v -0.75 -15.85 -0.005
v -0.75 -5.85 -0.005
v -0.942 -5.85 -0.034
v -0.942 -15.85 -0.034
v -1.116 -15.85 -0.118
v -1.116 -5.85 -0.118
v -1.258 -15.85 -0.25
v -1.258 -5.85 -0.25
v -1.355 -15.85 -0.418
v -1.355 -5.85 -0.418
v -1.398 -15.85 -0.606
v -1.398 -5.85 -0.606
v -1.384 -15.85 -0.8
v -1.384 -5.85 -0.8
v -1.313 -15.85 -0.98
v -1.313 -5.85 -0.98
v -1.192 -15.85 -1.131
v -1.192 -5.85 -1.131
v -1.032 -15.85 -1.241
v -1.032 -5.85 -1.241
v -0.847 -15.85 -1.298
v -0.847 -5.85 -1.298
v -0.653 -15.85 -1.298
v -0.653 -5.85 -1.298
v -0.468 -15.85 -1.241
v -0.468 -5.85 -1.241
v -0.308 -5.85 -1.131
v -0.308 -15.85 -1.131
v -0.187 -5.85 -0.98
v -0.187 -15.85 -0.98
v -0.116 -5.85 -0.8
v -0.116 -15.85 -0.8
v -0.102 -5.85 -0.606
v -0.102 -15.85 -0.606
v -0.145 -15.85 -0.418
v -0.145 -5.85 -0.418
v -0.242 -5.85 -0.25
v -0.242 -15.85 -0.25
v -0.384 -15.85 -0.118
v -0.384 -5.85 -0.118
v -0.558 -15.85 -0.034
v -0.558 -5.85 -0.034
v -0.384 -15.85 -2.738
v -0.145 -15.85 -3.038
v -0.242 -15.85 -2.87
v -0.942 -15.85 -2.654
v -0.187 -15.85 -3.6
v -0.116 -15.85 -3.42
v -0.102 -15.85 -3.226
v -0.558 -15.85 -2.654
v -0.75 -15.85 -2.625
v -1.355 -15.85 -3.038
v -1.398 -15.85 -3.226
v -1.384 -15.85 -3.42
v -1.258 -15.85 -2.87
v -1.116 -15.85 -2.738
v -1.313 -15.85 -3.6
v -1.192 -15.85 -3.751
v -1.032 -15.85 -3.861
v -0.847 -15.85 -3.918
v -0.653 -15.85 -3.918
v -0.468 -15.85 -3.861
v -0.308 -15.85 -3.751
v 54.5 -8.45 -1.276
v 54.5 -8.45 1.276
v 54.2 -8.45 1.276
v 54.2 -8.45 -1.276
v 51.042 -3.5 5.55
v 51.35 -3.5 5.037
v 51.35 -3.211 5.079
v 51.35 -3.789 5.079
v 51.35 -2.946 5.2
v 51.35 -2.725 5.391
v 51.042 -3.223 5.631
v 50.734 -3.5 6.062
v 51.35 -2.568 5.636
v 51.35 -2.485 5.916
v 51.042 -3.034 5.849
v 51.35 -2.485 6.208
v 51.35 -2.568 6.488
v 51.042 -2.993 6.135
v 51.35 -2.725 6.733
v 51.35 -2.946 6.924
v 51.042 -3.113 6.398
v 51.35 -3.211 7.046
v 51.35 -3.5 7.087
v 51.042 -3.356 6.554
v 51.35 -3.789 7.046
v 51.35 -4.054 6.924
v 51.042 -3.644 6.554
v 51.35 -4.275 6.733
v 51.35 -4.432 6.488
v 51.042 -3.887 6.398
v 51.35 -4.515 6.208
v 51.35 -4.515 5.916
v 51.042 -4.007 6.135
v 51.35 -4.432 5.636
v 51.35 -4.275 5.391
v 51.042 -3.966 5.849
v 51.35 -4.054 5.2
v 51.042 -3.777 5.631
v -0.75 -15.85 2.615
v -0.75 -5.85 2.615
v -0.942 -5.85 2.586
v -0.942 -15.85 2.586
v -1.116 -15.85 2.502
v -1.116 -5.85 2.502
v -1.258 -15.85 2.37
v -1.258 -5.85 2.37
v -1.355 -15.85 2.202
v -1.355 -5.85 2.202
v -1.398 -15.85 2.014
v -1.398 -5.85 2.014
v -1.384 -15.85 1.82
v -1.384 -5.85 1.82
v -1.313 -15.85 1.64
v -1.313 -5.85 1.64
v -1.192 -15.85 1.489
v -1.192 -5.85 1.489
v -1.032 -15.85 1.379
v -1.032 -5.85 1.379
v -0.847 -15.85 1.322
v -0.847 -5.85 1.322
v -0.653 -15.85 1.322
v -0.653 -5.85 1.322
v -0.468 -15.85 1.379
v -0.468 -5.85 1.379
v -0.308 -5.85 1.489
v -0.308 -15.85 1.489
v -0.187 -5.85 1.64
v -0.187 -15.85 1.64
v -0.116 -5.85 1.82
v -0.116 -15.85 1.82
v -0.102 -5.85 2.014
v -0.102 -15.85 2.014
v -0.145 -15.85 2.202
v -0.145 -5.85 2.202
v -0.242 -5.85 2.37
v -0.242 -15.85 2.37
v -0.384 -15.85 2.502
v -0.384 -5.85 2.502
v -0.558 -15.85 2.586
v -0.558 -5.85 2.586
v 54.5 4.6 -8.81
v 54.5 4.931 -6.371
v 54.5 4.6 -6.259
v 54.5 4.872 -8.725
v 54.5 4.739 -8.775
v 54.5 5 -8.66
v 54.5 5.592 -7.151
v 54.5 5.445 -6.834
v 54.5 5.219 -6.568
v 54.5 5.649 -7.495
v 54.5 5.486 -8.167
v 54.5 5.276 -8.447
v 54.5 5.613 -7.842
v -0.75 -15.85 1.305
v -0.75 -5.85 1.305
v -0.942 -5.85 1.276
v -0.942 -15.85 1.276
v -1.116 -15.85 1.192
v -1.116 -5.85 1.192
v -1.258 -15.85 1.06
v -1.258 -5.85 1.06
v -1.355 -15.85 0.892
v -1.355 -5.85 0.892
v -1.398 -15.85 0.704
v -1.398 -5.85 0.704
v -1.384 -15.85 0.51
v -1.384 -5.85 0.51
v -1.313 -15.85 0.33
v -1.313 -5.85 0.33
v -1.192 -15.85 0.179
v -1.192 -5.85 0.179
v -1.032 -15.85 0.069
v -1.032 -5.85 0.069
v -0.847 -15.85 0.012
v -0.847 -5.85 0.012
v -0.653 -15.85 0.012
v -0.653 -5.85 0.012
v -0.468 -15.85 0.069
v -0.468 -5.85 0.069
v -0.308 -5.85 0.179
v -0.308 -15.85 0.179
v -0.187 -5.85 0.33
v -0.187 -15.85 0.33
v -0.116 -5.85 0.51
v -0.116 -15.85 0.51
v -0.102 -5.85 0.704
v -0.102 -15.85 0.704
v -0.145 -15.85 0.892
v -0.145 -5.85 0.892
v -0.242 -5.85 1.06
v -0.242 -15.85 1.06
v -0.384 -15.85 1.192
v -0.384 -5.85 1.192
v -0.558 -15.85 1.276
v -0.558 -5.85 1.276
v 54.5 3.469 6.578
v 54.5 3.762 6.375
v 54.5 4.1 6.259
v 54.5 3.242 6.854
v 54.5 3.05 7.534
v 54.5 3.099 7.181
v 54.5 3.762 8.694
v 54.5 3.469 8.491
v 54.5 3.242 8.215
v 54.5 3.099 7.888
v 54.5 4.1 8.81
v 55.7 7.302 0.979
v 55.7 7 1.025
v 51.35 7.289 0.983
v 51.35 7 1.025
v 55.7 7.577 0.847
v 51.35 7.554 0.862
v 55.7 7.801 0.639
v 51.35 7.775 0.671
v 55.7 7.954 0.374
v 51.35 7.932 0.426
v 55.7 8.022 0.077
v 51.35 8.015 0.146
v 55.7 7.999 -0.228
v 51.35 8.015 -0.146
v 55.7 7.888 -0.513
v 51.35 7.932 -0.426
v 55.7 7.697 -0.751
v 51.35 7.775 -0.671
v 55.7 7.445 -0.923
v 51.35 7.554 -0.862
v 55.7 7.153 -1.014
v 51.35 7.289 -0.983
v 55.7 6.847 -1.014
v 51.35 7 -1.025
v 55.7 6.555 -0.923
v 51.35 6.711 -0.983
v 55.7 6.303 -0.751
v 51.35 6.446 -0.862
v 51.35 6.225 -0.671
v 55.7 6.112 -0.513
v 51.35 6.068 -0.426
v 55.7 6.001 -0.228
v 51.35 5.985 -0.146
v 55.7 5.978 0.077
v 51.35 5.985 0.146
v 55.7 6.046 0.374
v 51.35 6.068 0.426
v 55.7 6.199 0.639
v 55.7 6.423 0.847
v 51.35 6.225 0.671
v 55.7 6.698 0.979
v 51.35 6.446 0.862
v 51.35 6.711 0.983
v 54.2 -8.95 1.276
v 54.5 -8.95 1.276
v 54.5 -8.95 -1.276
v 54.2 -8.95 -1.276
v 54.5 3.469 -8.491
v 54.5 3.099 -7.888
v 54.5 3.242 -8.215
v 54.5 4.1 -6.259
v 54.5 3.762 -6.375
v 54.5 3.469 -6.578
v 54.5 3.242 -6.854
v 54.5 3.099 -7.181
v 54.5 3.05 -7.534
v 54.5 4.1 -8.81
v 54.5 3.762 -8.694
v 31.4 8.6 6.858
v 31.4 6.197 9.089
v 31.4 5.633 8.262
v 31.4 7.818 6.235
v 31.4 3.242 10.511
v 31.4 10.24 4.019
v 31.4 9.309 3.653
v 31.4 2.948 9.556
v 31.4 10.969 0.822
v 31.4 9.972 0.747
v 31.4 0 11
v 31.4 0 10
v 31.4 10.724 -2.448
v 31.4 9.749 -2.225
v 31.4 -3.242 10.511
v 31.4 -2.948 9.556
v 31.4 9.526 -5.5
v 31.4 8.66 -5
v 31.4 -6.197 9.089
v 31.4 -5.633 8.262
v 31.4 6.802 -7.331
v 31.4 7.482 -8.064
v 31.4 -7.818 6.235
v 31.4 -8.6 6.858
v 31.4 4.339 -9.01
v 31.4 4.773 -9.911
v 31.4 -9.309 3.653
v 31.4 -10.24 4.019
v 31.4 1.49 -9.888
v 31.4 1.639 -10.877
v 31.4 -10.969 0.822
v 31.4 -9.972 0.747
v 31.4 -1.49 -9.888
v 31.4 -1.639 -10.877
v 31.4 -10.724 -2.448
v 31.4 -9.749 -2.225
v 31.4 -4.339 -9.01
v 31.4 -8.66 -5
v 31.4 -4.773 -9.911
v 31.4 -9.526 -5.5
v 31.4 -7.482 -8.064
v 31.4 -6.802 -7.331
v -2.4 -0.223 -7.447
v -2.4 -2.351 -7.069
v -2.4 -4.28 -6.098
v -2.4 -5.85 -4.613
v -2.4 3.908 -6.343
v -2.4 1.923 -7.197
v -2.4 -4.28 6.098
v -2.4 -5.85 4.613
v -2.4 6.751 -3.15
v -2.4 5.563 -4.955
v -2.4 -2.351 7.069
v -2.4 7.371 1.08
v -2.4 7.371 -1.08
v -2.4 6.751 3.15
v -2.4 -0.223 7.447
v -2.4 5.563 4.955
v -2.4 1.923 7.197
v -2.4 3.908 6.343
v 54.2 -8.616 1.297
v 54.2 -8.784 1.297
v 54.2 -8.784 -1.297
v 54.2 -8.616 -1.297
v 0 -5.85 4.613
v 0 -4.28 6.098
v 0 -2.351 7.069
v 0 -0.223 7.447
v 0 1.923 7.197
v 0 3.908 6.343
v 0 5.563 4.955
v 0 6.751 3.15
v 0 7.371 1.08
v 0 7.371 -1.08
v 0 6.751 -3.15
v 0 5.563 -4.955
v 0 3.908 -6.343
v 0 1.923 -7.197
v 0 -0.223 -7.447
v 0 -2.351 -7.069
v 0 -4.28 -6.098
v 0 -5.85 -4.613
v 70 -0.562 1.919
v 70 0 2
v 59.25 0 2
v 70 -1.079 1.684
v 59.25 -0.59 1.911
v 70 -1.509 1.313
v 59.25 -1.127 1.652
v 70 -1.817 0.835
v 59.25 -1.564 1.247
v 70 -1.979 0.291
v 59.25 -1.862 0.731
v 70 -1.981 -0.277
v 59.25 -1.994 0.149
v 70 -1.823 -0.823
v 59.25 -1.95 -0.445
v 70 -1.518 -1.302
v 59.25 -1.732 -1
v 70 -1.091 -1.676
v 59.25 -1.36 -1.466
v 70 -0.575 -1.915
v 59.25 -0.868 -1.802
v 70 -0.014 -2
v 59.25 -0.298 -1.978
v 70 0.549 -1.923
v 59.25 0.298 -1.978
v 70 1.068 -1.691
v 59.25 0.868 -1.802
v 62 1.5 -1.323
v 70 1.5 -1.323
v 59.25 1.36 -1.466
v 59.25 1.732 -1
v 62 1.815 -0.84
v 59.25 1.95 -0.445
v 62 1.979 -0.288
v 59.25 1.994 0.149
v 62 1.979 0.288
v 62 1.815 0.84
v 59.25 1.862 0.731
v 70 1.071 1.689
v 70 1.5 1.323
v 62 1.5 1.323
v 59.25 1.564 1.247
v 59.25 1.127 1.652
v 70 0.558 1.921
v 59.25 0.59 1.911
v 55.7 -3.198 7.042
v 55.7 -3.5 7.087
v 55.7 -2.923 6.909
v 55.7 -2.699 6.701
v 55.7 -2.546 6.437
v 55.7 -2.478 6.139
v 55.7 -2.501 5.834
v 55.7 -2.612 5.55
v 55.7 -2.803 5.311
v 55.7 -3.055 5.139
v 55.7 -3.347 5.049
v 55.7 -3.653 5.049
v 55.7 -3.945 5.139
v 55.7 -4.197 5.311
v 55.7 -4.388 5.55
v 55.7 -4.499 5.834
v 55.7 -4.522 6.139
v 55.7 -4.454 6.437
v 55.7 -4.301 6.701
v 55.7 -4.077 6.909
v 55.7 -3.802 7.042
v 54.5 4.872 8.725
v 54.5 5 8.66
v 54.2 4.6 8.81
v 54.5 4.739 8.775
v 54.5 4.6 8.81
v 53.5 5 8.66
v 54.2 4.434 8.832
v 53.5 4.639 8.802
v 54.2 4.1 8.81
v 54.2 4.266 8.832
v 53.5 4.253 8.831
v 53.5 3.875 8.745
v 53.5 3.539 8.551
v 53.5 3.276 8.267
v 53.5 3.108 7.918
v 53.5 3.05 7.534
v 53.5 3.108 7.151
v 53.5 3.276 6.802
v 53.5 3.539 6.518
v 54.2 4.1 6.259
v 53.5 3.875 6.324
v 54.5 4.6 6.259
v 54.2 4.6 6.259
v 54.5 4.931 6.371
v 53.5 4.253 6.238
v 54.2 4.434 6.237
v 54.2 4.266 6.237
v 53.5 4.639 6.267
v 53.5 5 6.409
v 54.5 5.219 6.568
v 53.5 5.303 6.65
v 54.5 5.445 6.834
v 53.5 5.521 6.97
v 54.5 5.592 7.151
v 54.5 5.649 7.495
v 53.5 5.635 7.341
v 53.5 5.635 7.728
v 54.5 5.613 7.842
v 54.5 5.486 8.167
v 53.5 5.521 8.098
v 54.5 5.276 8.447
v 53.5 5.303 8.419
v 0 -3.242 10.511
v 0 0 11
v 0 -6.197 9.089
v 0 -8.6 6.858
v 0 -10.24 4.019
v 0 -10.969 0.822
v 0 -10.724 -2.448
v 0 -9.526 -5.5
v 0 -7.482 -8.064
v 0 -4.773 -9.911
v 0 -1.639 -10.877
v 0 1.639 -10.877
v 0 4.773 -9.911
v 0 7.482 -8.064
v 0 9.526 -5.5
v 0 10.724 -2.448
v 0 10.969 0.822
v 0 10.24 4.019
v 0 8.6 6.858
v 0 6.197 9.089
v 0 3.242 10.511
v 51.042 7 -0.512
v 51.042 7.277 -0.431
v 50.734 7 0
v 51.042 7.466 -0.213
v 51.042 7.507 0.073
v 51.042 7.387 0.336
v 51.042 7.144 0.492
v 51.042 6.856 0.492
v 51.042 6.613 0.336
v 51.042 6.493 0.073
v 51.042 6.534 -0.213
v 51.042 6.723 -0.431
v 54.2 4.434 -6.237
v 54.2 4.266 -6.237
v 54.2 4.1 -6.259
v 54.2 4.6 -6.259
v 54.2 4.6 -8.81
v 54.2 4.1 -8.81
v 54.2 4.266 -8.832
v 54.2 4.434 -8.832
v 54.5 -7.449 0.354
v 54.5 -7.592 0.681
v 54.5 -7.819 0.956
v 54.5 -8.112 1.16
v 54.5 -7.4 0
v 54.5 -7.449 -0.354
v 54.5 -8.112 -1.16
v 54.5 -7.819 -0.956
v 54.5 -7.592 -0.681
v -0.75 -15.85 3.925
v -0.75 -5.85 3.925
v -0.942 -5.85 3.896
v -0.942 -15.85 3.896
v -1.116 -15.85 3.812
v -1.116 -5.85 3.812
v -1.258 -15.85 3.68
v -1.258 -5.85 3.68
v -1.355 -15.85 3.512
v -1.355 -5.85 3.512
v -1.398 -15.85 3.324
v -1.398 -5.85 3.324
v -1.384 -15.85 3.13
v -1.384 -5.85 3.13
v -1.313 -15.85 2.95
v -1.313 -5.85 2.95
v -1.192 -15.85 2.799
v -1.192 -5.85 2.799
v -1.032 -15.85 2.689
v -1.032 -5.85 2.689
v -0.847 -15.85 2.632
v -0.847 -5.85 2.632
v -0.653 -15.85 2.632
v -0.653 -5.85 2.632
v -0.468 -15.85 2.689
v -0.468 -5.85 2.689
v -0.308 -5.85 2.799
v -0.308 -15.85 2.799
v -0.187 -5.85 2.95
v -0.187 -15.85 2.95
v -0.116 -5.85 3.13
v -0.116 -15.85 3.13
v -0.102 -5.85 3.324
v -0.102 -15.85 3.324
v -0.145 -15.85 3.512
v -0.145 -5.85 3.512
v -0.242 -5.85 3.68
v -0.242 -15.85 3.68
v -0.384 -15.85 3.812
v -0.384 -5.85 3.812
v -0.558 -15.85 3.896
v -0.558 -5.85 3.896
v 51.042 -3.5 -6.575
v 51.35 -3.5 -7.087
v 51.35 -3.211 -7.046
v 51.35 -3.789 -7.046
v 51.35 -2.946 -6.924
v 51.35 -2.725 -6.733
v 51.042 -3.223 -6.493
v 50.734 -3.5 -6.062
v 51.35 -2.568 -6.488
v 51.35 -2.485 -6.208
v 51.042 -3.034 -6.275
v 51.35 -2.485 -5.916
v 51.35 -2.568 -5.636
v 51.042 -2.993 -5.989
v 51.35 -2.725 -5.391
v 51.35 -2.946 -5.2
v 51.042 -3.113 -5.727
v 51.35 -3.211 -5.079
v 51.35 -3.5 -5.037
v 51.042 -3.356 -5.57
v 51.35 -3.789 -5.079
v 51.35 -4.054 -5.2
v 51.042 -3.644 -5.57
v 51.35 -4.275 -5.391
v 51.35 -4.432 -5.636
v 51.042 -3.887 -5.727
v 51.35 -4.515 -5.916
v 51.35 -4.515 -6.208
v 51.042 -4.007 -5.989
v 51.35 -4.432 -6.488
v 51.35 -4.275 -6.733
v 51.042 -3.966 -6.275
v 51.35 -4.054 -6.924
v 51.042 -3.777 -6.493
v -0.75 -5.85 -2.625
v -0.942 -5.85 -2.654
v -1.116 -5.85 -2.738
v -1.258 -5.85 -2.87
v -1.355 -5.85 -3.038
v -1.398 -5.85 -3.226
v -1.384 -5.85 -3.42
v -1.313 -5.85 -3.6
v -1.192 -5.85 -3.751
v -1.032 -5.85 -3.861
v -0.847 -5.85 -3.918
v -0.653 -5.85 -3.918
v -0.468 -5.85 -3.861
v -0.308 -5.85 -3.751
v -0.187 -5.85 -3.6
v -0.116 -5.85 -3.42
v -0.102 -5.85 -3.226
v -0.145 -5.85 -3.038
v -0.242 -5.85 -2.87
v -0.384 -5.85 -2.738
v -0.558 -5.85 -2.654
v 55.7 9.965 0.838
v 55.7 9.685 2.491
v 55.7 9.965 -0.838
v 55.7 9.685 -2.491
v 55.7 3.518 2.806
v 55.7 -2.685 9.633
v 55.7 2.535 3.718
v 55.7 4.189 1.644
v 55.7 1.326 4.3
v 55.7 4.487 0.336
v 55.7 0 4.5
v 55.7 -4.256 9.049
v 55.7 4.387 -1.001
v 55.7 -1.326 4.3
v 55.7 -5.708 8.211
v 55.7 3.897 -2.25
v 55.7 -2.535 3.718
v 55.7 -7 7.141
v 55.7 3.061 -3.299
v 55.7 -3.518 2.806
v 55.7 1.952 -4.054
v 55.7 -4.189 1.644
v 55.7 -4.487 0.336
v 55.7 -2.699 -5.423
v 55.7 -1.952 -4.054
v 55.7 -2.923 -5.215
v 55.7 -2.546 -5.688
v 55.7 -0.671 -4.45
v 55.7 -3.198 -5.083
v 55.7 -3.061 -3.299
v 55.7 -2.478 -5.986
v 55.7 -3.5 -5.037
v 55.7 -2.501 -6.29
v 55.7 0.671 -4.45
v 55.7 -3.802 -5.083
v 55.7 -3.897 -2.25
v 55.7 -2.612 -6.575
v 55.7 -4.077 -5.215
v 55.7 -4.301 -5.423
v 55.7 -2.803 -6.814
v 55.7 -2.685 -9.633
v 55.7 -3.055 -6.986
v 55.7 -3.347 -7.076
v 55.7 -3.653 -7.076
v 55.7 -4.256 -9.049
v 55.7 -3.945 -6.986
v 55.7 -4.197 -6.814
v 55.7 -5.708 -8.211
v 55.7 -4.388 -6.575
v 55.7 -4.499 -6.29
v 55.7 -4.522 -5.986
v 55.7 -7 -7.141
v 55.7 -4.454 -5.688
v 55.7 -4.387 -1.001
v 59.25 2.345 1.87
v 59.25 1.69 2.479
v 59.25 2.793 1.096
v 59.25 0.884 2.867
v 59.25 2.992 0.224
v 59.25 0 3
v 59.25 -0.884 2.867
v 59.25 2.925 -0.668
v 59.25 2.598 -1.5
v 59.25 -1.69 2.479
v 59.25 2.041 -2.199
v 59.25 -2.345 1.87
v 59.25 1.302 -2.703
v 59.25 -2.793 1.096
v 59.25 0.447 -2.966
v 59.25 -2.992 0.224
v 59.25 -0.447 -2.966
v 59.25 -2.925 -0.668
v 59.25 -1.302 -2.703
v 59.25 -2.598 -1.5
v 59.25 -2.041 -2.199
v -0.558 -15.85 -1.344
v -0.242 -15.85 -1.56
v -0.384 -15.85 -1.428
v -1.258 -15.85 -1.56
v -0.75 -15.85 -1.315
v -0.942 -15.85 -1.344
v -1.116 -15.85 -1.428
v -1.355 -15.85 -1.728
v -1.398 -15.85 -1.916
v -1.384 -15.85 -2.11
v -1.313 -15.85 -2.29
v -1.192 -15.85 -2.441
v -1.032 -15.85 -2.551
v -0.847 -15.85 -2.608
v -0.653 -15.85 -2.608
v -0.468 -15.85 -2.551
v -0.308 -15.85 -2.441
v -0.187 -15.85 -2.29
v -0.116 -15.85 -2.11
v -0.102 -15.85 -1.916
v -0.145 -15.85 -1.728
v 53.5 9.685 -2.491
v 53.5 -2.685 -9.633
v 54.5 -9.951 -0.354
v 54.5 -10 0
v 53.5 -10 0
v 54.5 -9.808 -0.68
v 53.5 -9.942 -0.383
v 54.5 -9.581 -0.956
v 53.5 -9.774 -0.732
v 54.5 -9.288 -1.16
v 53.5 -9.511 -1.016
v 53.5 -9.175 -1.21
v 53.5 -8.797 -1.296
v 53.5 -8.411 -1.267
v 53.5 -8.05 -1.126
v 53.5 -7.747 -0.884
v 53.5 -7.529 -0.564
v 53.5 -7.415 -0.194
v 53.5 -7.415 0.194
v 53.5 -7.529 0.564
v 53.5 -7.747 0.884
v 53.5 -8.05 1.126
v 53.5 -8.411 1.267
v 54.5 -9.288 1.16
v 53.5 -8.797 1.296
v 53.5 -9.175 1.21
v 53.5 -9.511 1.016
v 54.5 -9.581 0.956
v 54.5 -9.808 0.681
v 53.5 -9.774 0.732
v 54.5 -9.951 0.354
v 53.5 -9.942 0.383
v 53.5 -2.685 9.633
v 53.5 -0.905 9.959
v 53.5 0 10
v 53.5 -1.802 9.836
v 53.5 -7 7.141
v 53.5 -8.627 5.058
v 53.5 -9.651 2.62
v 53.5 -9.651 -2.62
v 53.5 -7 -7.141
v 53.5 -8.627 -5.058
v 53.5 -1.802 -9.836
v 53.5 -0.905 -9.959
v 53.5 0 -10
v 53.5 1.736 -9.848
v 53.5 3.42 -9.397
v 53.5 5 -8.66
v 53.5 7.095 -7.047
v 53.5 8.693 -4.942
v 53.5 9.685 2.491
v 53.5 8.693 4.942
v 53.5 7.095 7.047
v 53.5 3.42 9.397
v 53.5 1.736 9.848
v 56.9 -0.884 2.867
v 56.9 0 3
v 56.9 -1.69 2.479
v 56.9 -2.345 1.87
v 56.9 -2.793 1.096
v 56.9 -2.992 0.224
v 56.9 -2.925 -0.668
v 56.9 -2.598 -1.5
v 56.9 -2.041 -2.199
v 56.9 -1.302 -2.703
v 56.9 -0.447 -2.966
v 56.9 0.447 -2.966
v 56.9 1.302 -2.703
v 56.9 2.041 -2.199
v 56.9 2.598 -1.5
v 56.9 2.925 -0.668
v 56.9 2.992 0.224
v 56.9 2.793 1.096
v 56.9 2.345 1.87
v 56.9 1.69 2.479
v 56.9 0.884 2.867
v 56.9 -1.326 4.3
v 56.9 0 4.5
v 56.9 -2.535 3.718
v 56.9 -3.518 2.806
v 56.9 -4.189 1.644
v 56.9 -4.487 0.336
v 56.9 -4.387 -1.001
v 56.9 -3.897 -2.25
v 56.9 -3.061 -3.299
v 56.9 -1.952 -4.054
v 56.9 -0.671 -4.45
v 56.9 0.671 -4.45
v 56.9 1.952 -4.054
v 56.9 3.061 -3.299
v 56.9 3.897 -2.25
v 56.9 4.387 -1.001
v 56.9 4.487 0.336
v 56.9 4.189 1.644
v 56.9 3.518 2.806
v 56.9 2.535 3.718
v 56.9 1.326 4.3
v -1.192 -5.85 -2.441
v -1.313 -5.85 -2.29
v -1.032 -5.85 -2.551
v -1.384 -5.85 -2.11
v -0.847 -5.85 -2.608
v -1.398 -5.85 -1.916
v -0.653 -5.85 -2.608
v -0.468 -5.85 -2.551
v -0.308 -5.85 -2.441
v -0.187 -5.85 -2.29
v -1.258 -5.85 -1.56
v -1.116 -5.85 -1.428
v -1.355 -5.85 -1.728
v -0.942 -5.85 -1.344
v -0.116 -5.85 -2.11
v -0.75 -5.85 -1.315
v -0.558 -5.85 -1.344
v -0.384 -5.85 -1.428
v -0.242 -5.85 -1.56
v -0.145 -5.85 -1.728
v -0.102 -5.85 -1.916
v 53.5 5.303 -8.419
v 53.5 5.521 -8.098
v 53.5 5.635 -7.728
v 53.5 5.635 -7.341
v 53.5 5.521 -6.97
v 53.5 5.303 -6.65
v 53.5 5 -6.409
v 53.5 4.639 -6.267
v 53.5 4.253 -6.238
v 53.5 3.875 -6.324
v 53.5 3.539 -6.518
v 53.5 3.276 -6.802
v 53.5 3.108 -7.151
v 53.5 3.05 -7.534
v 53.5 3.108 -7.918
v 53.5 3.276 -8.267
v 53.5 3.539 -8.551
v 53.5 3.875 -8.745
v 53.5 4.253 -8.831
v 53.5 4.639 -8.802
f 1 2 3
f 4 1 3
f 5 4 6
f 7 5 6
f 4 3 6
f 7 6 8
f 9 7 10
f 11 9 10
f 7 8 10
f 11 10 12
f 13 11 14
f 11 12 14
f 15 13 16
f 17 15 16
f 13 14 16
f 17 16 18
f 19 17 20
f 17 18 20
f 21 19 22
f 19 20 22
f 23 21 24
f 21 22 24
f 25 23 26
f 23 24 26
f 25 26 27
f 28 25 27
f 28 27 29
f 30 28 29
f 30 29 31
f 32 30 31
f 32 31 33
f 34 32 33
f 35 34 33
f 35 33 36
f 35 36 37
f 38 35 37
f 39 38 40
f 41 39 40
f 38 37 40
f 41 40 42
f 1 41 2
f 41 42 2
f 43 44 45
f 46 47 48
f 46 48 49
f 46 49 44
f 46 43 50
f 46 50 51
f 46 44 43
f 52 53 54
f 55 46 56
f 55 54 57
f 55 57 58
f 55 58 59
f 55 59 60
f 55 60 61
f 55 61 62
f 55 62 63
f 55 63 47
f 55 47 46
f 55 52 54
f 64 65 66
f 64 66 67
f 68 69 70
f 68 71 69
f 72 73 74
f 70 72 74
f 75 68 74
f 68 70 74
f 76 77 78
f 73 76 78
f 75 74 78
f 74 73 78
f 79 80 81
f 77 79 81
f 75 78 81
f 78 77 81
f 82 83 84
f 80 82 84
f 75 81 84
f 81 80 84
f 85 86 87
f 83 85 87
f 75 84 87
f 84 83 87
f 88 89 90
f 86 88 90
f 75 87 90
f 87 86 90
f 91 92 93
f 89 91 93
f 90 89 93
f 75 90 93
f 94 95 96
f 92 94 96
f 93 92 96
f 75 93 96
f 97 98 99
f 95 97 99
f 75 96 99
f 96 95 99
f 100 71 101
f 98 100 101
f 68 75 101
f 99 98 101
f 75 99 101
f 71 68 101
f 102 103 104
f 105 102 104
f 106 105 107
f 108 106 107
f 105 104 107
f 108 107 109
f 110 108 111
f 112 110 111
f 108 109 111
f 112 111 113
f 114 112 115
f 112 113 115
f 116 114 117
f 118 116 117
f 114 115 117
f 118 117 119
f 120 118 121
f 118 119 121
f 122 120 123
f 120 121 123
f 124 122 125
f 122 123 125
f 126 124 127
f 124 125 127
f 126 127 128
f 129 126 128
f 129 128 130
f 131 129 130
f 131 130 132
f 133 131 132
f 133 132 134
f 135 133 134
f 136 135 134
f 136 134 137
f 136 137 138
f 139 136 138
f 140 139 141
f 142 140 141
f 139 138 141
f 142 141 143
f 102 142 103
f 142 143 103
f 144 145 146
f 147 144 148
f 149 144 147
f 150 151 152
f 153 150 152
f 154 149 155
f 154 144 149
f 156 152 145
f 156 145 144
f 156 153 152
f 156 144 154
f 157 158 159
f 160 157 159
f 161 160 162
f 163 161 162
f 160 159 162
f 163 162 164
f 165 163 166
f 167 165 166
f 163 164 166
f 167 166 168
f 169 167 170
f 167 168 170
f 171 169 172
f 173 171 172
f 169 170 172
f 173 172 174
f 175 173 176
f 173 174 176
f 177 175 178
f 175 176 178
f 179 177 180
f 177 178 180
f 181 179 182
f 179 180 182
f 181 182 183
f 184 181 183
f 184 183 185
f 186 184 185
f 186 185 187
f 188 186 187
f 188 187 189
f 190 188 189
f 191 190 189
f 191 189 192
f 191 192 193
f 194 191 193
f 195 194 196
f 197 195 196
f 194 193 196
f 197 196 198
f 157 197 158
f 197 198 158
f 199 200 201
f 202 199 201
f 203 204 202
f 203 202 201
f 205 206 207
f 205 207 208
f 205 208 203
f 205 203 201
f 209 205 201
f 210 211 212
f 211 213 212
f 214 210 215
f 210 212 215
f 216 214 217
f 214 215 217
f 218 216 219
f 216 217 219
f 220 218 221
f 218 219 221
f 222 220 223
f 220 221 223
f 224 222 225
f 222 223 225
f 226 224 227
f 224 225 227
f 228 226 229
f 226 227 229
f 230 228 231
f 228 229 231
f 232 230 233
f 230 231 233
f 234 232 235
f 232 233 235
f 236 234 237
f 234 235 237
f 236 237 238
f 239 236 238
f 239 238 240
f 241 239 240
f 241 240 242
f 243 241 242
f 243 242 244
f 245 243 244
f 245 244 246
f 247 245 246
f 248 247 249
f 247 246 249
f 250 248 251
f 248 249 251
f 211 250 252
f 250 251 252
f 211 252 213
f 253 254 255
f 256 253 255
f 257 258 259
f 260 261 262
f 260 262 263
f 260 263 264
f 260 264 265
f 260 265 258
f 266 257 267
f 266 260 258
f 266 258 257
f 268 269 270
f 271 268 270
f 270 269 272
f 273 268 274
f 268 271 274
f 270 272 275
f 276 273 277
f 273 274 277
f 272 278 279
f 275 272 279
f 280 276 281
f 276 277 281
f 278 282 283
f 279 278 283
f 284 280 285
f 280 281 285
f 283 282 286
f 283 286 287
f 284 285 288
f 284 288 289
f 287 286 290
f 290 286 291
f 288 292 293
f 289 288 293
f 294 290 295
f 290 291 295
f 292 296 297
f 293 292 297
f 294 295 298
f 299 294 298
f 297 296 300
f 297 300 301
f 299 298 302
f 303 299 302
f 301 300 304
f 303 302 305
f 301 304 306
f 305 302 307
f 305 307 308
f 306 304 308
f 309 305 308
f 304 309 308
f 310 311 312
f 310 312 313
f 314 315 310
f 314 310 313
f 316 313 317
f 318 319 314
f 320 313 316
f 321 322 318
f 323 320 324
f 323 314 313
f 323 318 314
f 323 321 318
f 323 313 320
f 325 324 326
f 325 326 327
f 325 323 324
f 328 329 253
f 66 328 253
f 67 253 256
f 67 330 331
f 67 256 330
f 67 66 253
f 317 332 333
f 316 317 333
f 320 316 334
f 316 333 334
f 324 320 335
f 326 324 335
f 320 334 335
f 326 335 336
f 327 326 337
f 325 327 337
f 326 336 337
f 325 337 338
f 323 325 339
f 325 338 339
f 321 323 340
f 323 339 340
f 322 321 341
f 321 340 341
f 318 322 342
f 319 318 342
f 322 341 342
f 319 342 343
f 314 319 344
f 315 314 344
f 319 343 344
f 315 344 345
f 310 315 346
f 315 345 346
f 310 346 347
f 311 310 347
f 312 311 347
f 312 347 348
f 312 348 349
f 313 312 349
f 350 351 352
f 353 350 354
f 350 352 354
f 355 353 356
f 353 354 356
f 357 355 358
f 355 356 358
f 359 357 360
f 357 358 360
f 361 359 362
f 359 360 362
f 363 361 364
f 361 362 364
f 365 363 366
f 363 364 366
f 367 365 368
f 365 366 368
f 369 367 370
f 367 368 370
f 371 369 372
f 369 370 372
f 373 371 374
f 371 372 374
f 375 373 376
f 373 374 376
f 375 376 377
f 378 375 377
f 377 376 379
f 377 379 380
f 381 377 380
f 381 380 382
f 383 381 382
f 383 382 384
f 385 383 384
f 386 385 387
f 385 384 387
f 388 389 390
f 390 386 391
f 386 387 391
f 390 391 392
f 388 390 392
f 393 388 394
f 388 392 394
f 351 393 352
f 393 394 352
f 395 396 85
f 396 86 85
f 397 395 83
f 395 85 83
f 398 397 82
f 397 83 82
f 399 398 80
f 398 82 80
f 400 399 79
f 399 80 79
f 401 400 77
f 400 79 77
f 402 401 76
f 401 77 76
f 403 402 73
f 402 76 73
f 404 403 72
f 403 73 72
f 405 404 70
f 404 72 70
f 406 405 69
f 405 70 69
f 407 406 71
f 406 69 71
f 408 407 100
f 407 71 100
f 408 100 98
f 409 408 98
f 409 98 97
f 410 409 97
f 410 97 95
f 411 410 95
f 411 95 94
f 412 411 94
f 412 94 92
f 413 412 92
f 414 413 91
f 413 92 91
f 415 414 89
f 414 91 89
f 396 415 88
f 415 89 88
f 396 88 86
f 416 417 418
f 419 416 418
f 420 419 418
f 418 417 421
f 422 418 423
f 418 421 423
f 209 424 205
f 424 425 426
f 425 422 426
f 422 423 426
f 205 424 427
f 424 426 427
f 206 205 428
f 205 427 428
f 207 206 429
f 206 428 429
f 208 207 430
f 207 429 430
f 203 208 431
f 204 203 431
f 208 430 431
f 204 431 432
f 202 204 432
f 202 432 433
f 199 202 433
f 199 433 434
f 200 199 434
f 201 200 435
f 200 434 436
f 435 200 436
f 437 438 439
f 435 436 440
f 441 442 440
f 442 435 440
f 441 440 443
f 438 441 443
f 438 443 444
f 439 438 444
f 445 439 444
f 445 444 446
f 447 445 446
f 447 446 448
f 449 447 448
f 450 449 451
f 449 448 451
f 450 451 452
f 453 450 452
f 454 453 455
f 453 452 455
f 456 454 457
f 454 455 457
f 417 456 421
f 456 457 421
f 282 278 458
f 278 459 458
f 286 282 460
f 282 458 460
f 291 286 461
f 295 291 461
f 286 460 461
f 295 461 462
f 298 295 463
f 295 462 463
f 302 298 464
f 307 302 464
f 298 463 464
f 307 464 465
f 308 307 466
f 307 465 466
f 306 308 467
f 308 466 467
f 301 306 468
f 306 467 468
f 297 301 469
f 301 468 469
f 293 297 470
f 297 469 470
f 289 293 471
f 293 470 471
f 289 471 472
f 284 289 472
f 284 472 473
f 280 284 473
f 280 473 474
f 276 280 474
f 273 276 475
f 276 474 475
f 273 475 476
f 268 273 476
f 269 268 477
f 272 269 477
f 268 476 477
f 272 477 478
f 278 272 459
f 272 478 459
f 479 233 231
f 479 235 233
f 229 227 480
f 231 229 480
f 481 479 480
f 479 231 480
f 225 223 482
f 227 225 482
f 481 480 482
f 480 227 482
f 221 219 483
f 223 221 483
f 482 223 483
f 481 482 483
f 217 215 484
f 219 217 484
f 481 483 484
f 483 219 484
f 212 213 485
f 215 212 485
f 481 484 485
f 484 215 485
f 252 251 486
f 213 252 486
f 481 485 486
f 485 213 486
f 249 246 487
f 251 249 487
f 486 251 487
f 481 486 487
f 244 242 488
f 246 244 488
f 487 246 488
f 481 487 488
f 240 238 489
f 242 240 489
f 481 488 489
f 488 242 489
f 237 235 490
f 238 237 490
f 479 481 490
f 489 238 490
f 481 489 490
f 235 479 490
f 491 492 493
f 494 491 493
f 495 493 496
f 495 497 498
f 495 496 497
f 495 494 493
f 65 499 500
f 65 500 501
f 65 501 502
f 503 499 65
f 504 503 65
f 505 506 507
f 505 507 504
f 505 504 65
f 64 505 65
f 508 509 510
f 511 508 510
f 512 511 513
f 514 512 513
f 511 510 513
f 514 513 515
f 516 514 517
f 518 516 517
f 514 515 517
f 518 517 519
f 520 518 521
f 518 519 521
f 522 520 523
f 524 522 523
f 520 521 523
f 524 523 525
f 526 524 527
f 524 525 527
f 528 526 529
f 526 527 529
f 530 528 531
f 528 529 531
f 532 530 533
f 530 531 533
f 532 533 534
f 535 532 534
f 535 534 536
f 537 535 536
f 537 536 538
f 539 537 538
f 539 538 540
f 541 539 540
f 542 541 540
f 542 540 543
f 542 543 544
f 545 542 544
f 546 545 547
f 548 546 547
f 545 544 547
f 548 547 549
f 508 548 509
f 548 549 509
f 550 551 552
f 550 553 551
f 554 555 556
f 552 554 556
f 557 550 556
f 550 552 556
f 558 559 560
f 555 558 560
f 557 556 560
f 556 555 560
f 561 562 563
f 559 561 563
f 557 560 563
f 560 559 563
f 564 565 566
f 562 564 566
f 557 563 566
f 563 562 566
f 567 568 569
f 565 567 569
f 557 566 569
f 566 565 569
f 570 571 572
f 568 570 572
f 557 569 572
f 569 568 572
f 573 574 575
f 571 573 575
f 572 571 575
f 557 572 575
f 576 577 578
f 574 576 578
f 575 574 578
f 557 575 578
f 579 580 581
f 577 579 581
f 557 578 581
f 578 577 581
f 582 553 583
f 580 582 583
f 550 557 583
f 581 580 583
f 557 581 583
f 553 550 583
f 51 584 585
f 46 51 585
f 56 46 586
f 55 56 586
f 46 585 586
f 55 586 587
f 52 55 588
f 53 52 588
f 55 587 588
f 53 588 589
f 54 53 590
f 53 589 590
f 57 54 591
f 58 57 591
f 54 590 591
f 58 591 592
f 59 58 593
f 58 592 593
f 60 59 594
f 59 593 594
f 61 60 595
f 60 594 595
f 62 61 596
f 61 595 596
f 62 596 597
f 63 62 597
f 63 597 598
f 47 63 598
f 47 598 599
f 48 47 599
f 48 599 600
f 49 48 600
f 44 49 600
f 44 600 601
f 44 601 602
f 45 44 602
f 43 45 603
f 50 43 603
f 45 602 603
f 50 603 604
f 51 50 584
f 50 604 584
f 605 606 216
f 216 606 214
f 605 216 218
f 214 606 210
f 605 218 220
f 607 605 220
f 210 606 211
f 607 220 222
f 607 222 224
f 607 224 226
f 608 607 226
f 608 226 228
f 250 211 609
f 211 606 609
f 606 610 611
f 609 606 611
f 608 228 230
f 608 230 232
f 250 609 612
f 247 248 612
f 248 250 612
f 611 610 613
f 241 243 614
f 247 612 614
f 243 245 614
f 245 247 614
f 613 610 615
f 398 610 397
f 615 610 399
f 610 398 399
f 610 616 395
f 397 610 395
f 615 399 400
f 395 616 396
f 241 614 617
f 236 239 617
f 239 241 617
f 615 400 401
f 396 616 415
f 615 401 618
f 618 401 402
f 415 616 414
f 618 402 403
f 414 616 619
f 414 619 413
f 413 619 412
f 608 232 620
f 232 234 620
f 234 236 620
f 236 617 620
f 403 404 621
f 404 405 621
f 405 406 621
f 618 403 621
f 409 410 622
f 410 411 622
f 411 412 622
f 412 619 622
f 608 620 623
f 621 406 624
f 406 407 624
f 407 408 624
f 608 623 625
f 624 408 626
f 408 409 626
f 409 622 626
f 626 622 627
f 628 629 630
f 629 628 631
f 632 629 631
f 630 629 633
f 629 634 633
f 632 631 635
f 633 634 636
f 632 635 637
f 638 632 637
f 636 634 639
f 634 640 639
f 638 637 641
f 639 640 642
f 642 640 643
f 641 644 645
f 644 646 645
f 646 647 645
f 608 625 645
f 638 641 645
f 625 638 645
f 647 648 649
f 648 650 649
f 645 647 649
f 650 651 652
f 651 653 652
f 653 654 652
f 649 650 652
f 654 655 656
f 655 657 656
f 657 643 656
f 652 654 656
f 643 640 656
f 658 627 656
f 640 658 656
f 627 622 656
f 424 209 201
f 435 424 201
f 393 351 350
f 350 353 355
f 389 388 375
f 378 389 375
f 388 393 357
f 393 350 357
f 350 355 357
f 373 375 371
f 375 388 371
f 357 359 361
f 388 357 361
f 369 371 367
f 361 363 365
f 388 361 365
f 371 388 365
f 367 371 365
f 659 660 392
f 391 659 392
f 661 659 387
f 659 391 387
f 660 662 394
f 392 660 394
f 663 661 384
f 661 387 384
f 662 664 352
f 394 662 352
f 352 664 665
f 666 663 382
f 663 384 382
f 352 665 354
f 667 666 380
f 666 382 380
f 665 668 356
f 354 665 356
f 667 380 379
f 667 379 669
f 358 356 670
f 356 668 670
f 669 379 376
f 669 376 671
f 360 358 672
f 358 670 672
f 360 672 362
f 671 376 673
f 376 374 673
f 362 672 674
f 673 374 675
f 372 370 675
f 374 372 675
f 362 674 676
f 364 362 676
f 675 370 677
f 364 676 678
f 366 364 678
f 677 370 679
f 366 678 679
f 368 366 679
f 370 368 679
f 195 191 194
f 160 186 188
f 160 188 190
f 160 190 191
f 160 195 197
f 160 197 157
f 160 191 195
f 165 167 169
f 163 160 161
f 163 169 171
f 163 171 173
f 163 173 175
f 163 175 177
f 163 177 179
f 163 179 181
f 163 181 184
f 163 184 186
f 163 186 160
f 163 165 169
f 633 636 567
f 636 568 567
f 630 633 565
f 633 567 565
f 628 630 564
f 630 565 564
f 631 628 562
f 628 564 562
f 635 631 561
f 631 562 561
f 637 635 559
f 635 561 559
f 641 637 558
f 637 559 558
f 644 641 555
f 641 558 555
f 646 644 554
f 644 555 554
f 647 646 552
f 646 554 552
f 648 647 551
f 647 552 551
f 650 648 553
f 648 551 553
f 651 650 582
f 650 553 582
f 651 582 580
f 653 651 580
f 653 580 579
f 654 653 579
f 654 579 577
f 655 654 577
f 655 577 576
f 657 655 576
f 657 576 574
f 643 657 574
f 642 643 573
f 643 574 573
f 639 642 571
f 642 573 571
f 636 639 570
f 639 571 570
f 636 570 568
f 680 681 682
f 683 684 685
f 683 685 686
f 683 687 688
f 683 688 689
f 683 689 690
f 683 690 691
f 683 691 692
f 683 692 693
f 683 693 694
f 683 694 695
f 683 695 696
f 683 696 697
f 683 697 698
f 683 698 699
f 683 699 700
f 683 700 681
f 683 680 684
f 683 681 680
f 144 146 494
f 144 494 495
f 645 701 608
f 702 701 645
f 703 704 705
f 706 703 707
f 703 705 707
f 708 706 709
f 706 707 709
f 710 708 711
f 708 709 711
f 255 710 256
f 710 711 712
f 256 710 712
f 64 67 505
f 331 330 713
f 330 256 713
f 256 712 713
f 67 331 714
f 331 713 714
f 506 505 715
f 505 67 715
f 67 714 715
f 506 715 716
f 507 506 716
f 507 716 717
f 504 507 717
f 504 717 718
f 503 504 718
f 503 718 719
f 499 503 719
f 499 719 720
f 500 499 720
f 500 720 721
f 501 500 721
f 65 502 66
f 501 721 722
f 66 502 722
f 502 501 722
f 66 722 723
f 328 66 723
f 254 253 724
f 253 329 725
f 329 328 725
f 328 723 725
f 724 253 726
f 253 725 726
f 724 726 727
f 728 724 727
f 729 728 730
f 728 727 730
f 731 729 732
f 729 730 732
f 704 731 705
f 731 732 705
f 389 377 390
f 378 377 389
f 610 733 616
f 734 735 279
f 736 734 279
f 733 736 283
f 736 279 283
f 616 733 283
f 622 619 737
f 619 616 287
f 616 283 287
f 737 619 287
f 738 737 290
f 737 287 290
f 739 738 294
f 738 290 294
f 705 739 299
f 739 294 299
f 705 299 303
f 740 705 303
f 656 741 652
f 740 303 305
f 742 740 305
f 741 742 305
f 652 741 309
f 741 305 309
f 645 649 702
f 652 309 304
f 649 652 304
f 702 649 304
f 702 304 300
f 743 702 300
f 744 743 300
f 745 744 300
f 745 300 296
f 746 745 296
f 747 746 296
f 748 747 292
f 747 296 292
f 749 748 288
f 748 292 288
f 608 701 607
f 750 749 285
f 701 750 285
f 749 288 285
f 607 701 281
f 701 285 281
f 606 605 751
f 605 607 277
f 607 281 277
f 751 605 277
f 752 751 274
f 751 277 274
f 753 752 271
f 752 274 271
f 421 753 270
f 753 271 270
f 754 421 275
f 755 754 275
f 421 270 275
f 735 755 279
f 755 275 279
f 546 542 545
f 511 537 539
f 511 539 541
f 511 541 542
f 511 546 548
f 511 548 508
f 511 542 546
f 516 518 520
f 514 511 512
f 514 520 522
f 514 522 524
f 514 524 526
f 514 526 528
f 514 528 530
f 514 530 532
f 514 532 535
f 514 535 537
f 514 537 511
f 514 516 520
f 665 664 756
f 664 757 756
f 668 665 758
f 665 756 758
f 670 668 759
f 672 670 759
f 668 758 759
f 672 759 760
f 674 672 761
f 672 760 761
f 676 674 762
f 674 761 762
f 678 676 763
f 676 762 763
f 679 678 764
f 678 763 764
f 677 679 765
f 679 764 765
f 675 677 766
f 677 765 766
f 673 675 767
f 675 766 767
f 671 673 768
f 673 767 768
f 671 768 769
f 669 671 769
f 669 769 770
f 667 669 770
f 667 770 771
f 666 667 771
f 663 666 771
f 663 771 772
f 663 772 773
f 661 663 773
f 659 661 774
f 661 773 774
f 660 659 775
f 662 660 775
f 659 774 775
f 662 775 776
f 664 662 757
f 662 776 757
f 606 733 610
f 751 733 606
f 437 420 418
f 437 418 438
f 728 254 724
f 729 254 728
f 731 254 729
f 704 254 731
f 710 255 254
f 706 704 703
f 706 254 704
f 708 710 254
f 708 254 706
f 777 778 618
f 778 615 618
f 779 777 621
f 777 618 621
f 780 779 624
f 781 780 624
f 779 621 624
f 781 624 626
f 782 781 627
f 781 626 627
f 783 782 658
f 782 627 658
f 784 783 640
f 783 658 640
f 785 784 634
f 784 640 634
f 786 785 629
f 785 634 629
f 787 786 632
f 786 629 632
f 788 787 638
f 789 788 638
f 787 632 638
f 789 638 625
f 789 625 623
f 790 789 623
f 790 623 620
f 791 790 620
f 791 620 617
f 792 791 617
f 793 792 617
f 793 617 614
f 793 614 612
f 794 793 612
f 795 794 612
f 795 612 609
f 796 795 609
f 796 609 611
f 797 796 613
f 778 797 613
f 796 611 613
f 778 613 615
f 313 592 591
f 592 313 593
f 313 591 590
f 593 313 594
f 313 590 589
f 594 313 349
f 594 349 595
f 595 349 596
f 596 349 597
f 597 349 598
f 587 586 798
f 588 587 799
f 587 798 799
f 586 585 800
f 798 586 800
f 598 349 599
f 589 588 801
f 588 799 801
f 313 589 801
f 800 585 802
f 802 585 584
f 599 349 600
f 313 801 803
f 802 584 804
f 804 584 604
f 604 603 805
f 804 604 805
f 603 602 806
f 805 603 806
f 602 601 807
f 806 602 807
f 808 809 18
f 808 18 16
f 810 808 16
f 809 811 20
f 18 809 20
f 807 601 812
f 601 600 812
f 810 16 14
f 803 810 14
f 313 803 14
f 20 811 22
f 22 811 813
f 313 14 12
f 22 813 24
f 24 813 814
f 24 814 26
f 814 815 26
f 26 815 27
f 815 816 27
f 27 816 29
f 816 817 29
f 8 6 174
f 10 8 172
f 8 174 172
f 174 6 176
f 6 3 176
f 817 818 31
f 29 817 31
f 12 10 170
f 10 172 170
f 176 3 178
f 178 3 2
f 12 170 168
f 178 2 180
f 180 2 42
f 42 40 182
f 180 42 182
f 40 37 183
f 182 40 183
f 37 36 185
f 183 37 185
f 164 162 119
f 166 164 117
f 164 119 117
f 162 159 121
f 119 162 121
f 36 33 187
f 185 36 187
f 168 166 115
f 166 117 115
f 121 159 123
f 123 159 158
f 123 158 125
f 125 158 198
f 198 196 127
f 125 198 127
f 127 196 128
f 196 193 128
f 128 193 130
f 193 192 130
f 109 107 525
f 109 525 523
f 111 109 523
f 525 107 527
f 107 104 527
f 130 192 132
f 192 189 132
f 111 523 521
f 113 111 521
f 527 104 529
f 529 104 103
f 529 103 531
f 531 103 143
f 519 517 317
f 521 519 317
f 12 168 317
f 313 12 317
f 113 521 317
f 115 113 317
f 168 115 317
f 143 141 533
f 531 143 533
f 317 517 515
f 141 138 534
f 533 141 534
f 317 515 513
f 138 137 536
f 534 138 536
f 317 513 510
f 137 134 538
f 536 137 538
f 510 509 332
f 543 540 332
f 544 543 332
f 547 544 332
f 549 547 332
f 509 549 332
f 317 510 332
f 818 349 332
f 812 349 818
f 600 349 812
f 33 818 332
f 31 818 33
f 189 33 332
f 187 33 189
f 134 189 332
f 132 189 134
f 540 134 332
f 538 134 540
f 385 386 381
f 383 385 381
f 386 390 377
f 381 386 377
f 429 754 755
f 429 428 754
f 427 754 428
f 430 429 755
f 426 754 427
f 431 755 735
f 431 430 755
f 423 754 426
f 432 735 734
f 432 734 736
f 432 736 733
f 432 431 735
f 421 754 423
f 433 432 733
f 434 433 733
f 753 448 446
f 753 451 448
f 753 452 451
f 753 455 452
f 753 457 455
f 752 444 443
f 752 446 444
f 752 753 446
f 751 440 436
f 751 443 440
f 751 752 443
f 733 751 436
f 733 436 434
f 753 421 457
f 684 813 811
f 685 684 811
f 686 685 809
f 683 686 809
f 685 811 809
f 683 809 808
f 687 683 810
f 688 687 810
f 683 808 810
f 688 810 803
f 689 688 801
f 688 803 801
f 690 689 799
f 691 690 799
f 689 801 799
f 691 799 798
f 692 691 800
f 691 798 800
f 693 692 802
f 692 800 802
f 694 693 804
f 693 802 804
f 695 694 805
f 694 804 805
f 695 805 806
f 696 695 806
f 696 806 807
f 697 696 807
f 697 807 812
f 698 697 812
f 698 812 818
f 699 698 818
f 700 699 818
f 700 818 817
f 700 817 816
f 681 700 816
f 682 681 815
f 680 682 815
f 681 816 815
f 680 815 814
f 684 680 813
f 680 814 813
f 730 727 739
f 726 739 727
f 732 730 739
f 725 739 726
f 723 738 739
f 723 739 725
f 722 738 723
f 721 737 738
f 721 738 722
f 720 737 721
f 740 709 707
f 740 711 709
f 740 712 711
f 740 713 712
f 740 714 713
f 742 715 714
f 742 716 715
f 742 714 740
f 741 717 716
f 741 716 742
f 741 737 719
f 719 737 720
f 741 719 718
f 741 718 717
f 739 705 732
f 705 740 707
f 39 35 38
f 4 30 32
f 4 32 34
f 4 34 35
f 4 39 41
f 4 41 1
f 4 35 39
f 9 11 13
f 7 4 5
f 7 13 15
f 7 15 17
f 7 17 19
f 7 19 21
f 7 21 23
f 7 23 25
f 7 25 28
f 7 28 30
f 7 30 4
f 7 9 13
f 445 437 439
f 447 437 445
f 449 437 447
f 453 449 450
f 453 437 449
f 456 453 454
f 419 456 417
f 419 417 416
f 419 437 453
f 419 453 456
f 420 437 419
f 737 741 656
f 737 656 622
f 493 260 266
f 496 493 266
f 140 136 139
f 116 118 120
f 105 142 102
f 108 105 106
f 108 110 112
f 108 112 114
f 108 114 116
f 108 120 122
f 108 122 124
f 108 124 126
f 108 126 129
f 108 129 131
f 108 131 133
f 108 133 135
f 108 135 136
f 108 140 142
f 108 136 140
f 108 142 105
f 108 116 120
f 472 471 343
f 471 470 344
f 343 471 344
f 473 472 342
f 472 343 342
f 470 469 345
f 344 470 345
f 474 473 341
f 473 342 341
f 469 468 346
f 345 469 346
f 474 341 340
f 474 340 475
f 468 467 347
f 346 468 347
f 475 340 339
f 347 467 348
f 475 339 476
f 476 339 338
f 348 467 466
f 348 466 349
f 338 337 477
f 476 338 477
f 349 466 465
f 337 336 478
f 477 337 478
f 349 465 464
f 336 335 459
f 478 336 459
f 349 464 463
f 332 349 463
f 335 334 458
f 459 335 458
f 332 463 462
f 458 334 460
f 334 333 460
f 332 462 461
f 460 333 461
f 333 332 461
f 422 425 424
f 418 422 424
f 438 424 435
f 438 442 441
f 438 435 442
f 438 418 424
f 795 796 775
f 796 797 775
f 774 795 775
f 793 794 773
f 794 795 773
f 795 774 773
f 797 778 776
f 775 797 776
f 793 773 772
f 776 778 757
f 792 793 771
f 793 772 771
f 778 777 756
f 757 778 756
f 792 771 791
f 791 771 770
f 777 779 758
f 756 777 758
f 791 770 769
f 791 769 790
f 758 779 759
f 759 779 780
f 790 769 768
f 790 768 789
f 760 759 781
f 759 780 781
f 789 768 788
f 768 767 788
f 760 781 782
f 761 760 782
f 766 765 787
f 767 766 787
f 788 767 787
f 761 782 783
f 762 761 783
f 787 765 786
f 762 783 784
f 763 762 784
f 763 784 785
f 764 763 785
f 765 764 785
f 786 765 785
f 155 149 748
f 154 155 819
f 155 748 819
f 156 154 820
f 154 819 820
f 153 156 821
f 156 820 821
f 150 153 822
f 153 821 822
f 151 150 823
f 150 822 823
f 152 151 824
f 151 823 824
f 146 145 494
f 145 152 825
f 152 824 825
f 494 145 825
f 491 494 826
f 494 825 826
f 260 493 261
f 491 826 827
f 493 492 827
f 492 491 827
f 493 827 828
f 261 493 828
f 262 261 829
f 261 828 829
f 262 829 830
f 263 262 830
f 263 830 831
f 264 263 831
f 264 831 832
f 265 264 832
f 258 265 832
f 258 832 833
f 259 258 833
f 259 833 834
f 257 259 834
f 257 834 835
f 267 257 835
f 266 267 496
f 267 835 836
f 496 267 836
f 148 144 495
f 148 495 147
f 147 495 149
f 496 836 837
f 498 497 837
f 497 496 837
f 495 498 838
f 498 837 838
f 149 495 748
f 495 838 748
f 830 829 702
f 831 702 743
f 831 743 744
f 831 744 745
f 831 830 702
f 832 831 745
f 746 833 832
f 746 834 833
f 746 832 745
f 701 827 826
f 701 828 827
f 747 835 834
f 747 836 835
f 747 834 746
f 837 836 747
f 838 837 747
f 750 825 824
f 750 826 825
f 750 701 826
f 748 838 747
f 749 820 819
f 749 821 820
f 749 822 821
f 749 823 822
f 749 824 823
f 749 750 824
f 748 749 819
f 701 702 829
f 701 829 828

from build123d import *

# Parameters (mm, degrees)
TROU_TARAUD_M2_51_D          = 2.05
TROU_TARAUD_M2_51_DEPTH      = 4.35
TROU_TARAUD_M2_51_TIP        = 0.615882135
ENL_V_START                  = -2.2
ENL_V_MAT_EXTRU_1_DEPTH      = 2.2
ESQUISSE5_R                  = 1.3
BOSS_EXTRU_1_DEPTH           = 1
ESQUISSE6_W                  = 2.6
ESQUISSE6_H                  = 0.5
ENL_V_MAT_EXTRU_2_DEPTH      = 0.3
ENL_V_MAT_EXTRU_3_DEPTH      = 72.707740168
ENL_V_MAT_EXTRU_3_DEPTH_BACK = 72.707740168
ESQUISSE7_W                  = 8
ESQUISSE7_H                  = 0.5
BOSS_EXTRU_2_DEPTH           = 2.4
ESQUISSE9_R                  = 0.65
BOSS_EXTRU_3_DEPTH           = 10


with BuildPart() as part:
    # Esquisse1 → Révolution1 (revolve)
    with BuildSketch(Plane.XY, mode=Mode.PRIVATE) as r_volution1_sk:
        Polygon((70, 0), (70, 2), (59.25, 2), (59.25, 3), (56.9, 3), (56.9, 4.5), (55.7, 4.5), (55.7, 10), (31.4, 10), (31.4, 11), (0, 11), (0, 0), align=None)
    revolve(r_volution1_sk.sketch.rotate(Axis((0, 0, 0), (1, 0, 0)), 90), axis=Axis((0, 0, 0), (1, 0, 0)))

    # Trou taraudé M2.51
    with Locations(Plane(origin=(55.7, 0, 0), x_dir=(0, 0, -1), z_dir=(1, 0, 0))):
        with Locations((0, 7), (-6.062177826, -3.5), (6.062177826, -3.5)):
            Hole(TROU_TARAUD_M2_51_D / 2, depth=TROU_TARAUD_M2_51_DEPTH)
            with Locations((0, 0, -(TROU_TARAUD_M2_51_DEPTH + TROU_TARAUD_M2_51_TIP / 2))):  # 118° drill point
                Cone(0, TROU_TARAUD_M2_51_D / 2, TROU_TARAUD_M2_51_TIP, mode=Mode.SUBTRACT)

    # Esquisse4 → Enlèv. mat.-Extru.1 (cut)
    with BuildSketch(Plane(origin=(55.7, 0, 0), x_dir=(0, 0, -1), z_dir=(1, 0, 0)).offset(ENL_V_START)):
        with BuildLine():
            Line((-9.632892041, -2.684658438), (-2.491463612, 9.684658438))
            ThreePointArc((-2.491463612, 9.684658438), (-8.660254038, 5), (-9.632892041, -2.684658438))
        make_face()
        with BuildLine():
            Line((0, -7), (-7.141428429, -7))
            ThreePointArc((-7.141428429, -7), (-3.872983346, -9.219544457), (0, -10))
            Line((0, -10), (0, -7))
        make_face()
        with BuildLine():
            ThreePointArc((0, -10), (3.872983346, -9.219544457), (7.141428429, -7))
            Line((7.141428429, -7), (0, -7))
            Line((0, -7), (0, -10))
        make_face()
        with BuildLine():
            ThreePointArc((10, 0), (7.902994247, 6.127208332), (2.491463612, 9.684658438))
            Line((2.491463612, 9.684658438), (9.632892041, -2.684658438))
            ThreePointArc((9.632892041, -2.684658438), (9.907797949, -1.354820946), (10, 0))
        make_face()
    extrude(amount=ENL_V_MAT_EXTRU_1_DEPTH, mode=Mode.SUBTRACT)

    # Esquisse5 → Boss.-Extru.1 (add)
    with BuildSketch(Plane(origin=(53.5, 0, 0), x_dir=(0, 0, -1), z_dir=(1, 0, 0))):
        with Locations(Location((-7.534421013, 4.35, 0), (0, 0, 149.999238117))):
            Circle(ESQUISSE5_R)
        with Locations(Location((7.534421013, 4.35, 0), (0, 0, 29.999238117))):
            Circle(ESQUISSE5_R)
        with Locations(Location((0, -8.7, 0), (0, 0, 269.999238081))):
            Circle(ESQUISSE5_R)
    extrude(amount=BOSS_EXTRU_1_DEPTH)

    # Esquisse6 → Enlèv. mat.-Extru.2 (cut)
    with BuildSketch(Plane(origin=(54.5, 0, 0), x_dir=(0, 0, -1), z_dir=(1, 0, 0))):
        with Locations((-7.534421013, 4.35)):
            Rectangle(ESQUISSE6_W, ESQUISSE6_H)
        with Locations((7.534421013, 4.35)):
            Rectangle(ESQUISSE6_W, ESQUISSE6_H)
        with Locations((0, -8.7)):
            Rectangle(ESQUISSE6_W, ESQUISSE6_H)
    extrude(amount=-ENL_V_MAT_EXTRU_2_DEPTH, mode=Mode.SUBTRACT)

    # Esquisse7 → Enlèv. mat.-Extru.3 (cut, two sides: drawn at the far end of the back side and taken through both)
    with BuildSketch(Plane.XY.offset(-ENL_V_MAT_EXTRU_3_DEPTH_BACK)):
        with Locations((66, 1.75)):
            Rectangle(ESQUISSE7_W, ESQUISSE7_H)
    extrude(amount=ENL_V_MAT_EXTRU_3_DEPTH + ENL_V_MAT_EXTRU_3_DEPTH_BACK, mode=Mode.SUBTRACT)

    # Esquisse8 → Boss.-Extru.2 (add)
    with BuildSketch(Plane.ZY):
        with BuildLine():
            Line((-4.613025038, -5.85), (4.613025038, -5.85))
            ThreePointArc((4.613025038, -5.85), (0, 7.45), (-4.613025038, -5.85))
        make_face()
    extrude(amount=BOSS_EXTRU_2_DEPTH)

    # Esquisse9 → Boss.-Extru.3 (add)
    with BuildSketch(Plane.XZ.offset(5.85)):
        with Locations(Location((-0.75, 3.275, 0), (0, 0, 90))):
            Circle(ESQUISSE9_R)
        with Locations(Location((-0.75, 1.965, 0), (0, 0, 90))):
            Circle(ESQUISSE9_R)
        with Locations(Location((-0.75, 0.655, 0), (0, 0, 90))):
            Circle(ESQUISSE9_R)
        with Locations(Location((-0.75, -0.655, 0), (0, 0, 90))):
            Circle(ESQUISSE9_R)
        with Locations(Location((-0.75, -1.965, 0), (0, 0, 90))):
            Circle(ESQUISSE9_R)
        with Locations(Location((-0.75, -3.275, 0), (0, 0, 90))):
            Circle(ESQUISSE9_R)
    extrude(amount=BOSS_EXTRU_3_DEPTH)


solid = part.part
